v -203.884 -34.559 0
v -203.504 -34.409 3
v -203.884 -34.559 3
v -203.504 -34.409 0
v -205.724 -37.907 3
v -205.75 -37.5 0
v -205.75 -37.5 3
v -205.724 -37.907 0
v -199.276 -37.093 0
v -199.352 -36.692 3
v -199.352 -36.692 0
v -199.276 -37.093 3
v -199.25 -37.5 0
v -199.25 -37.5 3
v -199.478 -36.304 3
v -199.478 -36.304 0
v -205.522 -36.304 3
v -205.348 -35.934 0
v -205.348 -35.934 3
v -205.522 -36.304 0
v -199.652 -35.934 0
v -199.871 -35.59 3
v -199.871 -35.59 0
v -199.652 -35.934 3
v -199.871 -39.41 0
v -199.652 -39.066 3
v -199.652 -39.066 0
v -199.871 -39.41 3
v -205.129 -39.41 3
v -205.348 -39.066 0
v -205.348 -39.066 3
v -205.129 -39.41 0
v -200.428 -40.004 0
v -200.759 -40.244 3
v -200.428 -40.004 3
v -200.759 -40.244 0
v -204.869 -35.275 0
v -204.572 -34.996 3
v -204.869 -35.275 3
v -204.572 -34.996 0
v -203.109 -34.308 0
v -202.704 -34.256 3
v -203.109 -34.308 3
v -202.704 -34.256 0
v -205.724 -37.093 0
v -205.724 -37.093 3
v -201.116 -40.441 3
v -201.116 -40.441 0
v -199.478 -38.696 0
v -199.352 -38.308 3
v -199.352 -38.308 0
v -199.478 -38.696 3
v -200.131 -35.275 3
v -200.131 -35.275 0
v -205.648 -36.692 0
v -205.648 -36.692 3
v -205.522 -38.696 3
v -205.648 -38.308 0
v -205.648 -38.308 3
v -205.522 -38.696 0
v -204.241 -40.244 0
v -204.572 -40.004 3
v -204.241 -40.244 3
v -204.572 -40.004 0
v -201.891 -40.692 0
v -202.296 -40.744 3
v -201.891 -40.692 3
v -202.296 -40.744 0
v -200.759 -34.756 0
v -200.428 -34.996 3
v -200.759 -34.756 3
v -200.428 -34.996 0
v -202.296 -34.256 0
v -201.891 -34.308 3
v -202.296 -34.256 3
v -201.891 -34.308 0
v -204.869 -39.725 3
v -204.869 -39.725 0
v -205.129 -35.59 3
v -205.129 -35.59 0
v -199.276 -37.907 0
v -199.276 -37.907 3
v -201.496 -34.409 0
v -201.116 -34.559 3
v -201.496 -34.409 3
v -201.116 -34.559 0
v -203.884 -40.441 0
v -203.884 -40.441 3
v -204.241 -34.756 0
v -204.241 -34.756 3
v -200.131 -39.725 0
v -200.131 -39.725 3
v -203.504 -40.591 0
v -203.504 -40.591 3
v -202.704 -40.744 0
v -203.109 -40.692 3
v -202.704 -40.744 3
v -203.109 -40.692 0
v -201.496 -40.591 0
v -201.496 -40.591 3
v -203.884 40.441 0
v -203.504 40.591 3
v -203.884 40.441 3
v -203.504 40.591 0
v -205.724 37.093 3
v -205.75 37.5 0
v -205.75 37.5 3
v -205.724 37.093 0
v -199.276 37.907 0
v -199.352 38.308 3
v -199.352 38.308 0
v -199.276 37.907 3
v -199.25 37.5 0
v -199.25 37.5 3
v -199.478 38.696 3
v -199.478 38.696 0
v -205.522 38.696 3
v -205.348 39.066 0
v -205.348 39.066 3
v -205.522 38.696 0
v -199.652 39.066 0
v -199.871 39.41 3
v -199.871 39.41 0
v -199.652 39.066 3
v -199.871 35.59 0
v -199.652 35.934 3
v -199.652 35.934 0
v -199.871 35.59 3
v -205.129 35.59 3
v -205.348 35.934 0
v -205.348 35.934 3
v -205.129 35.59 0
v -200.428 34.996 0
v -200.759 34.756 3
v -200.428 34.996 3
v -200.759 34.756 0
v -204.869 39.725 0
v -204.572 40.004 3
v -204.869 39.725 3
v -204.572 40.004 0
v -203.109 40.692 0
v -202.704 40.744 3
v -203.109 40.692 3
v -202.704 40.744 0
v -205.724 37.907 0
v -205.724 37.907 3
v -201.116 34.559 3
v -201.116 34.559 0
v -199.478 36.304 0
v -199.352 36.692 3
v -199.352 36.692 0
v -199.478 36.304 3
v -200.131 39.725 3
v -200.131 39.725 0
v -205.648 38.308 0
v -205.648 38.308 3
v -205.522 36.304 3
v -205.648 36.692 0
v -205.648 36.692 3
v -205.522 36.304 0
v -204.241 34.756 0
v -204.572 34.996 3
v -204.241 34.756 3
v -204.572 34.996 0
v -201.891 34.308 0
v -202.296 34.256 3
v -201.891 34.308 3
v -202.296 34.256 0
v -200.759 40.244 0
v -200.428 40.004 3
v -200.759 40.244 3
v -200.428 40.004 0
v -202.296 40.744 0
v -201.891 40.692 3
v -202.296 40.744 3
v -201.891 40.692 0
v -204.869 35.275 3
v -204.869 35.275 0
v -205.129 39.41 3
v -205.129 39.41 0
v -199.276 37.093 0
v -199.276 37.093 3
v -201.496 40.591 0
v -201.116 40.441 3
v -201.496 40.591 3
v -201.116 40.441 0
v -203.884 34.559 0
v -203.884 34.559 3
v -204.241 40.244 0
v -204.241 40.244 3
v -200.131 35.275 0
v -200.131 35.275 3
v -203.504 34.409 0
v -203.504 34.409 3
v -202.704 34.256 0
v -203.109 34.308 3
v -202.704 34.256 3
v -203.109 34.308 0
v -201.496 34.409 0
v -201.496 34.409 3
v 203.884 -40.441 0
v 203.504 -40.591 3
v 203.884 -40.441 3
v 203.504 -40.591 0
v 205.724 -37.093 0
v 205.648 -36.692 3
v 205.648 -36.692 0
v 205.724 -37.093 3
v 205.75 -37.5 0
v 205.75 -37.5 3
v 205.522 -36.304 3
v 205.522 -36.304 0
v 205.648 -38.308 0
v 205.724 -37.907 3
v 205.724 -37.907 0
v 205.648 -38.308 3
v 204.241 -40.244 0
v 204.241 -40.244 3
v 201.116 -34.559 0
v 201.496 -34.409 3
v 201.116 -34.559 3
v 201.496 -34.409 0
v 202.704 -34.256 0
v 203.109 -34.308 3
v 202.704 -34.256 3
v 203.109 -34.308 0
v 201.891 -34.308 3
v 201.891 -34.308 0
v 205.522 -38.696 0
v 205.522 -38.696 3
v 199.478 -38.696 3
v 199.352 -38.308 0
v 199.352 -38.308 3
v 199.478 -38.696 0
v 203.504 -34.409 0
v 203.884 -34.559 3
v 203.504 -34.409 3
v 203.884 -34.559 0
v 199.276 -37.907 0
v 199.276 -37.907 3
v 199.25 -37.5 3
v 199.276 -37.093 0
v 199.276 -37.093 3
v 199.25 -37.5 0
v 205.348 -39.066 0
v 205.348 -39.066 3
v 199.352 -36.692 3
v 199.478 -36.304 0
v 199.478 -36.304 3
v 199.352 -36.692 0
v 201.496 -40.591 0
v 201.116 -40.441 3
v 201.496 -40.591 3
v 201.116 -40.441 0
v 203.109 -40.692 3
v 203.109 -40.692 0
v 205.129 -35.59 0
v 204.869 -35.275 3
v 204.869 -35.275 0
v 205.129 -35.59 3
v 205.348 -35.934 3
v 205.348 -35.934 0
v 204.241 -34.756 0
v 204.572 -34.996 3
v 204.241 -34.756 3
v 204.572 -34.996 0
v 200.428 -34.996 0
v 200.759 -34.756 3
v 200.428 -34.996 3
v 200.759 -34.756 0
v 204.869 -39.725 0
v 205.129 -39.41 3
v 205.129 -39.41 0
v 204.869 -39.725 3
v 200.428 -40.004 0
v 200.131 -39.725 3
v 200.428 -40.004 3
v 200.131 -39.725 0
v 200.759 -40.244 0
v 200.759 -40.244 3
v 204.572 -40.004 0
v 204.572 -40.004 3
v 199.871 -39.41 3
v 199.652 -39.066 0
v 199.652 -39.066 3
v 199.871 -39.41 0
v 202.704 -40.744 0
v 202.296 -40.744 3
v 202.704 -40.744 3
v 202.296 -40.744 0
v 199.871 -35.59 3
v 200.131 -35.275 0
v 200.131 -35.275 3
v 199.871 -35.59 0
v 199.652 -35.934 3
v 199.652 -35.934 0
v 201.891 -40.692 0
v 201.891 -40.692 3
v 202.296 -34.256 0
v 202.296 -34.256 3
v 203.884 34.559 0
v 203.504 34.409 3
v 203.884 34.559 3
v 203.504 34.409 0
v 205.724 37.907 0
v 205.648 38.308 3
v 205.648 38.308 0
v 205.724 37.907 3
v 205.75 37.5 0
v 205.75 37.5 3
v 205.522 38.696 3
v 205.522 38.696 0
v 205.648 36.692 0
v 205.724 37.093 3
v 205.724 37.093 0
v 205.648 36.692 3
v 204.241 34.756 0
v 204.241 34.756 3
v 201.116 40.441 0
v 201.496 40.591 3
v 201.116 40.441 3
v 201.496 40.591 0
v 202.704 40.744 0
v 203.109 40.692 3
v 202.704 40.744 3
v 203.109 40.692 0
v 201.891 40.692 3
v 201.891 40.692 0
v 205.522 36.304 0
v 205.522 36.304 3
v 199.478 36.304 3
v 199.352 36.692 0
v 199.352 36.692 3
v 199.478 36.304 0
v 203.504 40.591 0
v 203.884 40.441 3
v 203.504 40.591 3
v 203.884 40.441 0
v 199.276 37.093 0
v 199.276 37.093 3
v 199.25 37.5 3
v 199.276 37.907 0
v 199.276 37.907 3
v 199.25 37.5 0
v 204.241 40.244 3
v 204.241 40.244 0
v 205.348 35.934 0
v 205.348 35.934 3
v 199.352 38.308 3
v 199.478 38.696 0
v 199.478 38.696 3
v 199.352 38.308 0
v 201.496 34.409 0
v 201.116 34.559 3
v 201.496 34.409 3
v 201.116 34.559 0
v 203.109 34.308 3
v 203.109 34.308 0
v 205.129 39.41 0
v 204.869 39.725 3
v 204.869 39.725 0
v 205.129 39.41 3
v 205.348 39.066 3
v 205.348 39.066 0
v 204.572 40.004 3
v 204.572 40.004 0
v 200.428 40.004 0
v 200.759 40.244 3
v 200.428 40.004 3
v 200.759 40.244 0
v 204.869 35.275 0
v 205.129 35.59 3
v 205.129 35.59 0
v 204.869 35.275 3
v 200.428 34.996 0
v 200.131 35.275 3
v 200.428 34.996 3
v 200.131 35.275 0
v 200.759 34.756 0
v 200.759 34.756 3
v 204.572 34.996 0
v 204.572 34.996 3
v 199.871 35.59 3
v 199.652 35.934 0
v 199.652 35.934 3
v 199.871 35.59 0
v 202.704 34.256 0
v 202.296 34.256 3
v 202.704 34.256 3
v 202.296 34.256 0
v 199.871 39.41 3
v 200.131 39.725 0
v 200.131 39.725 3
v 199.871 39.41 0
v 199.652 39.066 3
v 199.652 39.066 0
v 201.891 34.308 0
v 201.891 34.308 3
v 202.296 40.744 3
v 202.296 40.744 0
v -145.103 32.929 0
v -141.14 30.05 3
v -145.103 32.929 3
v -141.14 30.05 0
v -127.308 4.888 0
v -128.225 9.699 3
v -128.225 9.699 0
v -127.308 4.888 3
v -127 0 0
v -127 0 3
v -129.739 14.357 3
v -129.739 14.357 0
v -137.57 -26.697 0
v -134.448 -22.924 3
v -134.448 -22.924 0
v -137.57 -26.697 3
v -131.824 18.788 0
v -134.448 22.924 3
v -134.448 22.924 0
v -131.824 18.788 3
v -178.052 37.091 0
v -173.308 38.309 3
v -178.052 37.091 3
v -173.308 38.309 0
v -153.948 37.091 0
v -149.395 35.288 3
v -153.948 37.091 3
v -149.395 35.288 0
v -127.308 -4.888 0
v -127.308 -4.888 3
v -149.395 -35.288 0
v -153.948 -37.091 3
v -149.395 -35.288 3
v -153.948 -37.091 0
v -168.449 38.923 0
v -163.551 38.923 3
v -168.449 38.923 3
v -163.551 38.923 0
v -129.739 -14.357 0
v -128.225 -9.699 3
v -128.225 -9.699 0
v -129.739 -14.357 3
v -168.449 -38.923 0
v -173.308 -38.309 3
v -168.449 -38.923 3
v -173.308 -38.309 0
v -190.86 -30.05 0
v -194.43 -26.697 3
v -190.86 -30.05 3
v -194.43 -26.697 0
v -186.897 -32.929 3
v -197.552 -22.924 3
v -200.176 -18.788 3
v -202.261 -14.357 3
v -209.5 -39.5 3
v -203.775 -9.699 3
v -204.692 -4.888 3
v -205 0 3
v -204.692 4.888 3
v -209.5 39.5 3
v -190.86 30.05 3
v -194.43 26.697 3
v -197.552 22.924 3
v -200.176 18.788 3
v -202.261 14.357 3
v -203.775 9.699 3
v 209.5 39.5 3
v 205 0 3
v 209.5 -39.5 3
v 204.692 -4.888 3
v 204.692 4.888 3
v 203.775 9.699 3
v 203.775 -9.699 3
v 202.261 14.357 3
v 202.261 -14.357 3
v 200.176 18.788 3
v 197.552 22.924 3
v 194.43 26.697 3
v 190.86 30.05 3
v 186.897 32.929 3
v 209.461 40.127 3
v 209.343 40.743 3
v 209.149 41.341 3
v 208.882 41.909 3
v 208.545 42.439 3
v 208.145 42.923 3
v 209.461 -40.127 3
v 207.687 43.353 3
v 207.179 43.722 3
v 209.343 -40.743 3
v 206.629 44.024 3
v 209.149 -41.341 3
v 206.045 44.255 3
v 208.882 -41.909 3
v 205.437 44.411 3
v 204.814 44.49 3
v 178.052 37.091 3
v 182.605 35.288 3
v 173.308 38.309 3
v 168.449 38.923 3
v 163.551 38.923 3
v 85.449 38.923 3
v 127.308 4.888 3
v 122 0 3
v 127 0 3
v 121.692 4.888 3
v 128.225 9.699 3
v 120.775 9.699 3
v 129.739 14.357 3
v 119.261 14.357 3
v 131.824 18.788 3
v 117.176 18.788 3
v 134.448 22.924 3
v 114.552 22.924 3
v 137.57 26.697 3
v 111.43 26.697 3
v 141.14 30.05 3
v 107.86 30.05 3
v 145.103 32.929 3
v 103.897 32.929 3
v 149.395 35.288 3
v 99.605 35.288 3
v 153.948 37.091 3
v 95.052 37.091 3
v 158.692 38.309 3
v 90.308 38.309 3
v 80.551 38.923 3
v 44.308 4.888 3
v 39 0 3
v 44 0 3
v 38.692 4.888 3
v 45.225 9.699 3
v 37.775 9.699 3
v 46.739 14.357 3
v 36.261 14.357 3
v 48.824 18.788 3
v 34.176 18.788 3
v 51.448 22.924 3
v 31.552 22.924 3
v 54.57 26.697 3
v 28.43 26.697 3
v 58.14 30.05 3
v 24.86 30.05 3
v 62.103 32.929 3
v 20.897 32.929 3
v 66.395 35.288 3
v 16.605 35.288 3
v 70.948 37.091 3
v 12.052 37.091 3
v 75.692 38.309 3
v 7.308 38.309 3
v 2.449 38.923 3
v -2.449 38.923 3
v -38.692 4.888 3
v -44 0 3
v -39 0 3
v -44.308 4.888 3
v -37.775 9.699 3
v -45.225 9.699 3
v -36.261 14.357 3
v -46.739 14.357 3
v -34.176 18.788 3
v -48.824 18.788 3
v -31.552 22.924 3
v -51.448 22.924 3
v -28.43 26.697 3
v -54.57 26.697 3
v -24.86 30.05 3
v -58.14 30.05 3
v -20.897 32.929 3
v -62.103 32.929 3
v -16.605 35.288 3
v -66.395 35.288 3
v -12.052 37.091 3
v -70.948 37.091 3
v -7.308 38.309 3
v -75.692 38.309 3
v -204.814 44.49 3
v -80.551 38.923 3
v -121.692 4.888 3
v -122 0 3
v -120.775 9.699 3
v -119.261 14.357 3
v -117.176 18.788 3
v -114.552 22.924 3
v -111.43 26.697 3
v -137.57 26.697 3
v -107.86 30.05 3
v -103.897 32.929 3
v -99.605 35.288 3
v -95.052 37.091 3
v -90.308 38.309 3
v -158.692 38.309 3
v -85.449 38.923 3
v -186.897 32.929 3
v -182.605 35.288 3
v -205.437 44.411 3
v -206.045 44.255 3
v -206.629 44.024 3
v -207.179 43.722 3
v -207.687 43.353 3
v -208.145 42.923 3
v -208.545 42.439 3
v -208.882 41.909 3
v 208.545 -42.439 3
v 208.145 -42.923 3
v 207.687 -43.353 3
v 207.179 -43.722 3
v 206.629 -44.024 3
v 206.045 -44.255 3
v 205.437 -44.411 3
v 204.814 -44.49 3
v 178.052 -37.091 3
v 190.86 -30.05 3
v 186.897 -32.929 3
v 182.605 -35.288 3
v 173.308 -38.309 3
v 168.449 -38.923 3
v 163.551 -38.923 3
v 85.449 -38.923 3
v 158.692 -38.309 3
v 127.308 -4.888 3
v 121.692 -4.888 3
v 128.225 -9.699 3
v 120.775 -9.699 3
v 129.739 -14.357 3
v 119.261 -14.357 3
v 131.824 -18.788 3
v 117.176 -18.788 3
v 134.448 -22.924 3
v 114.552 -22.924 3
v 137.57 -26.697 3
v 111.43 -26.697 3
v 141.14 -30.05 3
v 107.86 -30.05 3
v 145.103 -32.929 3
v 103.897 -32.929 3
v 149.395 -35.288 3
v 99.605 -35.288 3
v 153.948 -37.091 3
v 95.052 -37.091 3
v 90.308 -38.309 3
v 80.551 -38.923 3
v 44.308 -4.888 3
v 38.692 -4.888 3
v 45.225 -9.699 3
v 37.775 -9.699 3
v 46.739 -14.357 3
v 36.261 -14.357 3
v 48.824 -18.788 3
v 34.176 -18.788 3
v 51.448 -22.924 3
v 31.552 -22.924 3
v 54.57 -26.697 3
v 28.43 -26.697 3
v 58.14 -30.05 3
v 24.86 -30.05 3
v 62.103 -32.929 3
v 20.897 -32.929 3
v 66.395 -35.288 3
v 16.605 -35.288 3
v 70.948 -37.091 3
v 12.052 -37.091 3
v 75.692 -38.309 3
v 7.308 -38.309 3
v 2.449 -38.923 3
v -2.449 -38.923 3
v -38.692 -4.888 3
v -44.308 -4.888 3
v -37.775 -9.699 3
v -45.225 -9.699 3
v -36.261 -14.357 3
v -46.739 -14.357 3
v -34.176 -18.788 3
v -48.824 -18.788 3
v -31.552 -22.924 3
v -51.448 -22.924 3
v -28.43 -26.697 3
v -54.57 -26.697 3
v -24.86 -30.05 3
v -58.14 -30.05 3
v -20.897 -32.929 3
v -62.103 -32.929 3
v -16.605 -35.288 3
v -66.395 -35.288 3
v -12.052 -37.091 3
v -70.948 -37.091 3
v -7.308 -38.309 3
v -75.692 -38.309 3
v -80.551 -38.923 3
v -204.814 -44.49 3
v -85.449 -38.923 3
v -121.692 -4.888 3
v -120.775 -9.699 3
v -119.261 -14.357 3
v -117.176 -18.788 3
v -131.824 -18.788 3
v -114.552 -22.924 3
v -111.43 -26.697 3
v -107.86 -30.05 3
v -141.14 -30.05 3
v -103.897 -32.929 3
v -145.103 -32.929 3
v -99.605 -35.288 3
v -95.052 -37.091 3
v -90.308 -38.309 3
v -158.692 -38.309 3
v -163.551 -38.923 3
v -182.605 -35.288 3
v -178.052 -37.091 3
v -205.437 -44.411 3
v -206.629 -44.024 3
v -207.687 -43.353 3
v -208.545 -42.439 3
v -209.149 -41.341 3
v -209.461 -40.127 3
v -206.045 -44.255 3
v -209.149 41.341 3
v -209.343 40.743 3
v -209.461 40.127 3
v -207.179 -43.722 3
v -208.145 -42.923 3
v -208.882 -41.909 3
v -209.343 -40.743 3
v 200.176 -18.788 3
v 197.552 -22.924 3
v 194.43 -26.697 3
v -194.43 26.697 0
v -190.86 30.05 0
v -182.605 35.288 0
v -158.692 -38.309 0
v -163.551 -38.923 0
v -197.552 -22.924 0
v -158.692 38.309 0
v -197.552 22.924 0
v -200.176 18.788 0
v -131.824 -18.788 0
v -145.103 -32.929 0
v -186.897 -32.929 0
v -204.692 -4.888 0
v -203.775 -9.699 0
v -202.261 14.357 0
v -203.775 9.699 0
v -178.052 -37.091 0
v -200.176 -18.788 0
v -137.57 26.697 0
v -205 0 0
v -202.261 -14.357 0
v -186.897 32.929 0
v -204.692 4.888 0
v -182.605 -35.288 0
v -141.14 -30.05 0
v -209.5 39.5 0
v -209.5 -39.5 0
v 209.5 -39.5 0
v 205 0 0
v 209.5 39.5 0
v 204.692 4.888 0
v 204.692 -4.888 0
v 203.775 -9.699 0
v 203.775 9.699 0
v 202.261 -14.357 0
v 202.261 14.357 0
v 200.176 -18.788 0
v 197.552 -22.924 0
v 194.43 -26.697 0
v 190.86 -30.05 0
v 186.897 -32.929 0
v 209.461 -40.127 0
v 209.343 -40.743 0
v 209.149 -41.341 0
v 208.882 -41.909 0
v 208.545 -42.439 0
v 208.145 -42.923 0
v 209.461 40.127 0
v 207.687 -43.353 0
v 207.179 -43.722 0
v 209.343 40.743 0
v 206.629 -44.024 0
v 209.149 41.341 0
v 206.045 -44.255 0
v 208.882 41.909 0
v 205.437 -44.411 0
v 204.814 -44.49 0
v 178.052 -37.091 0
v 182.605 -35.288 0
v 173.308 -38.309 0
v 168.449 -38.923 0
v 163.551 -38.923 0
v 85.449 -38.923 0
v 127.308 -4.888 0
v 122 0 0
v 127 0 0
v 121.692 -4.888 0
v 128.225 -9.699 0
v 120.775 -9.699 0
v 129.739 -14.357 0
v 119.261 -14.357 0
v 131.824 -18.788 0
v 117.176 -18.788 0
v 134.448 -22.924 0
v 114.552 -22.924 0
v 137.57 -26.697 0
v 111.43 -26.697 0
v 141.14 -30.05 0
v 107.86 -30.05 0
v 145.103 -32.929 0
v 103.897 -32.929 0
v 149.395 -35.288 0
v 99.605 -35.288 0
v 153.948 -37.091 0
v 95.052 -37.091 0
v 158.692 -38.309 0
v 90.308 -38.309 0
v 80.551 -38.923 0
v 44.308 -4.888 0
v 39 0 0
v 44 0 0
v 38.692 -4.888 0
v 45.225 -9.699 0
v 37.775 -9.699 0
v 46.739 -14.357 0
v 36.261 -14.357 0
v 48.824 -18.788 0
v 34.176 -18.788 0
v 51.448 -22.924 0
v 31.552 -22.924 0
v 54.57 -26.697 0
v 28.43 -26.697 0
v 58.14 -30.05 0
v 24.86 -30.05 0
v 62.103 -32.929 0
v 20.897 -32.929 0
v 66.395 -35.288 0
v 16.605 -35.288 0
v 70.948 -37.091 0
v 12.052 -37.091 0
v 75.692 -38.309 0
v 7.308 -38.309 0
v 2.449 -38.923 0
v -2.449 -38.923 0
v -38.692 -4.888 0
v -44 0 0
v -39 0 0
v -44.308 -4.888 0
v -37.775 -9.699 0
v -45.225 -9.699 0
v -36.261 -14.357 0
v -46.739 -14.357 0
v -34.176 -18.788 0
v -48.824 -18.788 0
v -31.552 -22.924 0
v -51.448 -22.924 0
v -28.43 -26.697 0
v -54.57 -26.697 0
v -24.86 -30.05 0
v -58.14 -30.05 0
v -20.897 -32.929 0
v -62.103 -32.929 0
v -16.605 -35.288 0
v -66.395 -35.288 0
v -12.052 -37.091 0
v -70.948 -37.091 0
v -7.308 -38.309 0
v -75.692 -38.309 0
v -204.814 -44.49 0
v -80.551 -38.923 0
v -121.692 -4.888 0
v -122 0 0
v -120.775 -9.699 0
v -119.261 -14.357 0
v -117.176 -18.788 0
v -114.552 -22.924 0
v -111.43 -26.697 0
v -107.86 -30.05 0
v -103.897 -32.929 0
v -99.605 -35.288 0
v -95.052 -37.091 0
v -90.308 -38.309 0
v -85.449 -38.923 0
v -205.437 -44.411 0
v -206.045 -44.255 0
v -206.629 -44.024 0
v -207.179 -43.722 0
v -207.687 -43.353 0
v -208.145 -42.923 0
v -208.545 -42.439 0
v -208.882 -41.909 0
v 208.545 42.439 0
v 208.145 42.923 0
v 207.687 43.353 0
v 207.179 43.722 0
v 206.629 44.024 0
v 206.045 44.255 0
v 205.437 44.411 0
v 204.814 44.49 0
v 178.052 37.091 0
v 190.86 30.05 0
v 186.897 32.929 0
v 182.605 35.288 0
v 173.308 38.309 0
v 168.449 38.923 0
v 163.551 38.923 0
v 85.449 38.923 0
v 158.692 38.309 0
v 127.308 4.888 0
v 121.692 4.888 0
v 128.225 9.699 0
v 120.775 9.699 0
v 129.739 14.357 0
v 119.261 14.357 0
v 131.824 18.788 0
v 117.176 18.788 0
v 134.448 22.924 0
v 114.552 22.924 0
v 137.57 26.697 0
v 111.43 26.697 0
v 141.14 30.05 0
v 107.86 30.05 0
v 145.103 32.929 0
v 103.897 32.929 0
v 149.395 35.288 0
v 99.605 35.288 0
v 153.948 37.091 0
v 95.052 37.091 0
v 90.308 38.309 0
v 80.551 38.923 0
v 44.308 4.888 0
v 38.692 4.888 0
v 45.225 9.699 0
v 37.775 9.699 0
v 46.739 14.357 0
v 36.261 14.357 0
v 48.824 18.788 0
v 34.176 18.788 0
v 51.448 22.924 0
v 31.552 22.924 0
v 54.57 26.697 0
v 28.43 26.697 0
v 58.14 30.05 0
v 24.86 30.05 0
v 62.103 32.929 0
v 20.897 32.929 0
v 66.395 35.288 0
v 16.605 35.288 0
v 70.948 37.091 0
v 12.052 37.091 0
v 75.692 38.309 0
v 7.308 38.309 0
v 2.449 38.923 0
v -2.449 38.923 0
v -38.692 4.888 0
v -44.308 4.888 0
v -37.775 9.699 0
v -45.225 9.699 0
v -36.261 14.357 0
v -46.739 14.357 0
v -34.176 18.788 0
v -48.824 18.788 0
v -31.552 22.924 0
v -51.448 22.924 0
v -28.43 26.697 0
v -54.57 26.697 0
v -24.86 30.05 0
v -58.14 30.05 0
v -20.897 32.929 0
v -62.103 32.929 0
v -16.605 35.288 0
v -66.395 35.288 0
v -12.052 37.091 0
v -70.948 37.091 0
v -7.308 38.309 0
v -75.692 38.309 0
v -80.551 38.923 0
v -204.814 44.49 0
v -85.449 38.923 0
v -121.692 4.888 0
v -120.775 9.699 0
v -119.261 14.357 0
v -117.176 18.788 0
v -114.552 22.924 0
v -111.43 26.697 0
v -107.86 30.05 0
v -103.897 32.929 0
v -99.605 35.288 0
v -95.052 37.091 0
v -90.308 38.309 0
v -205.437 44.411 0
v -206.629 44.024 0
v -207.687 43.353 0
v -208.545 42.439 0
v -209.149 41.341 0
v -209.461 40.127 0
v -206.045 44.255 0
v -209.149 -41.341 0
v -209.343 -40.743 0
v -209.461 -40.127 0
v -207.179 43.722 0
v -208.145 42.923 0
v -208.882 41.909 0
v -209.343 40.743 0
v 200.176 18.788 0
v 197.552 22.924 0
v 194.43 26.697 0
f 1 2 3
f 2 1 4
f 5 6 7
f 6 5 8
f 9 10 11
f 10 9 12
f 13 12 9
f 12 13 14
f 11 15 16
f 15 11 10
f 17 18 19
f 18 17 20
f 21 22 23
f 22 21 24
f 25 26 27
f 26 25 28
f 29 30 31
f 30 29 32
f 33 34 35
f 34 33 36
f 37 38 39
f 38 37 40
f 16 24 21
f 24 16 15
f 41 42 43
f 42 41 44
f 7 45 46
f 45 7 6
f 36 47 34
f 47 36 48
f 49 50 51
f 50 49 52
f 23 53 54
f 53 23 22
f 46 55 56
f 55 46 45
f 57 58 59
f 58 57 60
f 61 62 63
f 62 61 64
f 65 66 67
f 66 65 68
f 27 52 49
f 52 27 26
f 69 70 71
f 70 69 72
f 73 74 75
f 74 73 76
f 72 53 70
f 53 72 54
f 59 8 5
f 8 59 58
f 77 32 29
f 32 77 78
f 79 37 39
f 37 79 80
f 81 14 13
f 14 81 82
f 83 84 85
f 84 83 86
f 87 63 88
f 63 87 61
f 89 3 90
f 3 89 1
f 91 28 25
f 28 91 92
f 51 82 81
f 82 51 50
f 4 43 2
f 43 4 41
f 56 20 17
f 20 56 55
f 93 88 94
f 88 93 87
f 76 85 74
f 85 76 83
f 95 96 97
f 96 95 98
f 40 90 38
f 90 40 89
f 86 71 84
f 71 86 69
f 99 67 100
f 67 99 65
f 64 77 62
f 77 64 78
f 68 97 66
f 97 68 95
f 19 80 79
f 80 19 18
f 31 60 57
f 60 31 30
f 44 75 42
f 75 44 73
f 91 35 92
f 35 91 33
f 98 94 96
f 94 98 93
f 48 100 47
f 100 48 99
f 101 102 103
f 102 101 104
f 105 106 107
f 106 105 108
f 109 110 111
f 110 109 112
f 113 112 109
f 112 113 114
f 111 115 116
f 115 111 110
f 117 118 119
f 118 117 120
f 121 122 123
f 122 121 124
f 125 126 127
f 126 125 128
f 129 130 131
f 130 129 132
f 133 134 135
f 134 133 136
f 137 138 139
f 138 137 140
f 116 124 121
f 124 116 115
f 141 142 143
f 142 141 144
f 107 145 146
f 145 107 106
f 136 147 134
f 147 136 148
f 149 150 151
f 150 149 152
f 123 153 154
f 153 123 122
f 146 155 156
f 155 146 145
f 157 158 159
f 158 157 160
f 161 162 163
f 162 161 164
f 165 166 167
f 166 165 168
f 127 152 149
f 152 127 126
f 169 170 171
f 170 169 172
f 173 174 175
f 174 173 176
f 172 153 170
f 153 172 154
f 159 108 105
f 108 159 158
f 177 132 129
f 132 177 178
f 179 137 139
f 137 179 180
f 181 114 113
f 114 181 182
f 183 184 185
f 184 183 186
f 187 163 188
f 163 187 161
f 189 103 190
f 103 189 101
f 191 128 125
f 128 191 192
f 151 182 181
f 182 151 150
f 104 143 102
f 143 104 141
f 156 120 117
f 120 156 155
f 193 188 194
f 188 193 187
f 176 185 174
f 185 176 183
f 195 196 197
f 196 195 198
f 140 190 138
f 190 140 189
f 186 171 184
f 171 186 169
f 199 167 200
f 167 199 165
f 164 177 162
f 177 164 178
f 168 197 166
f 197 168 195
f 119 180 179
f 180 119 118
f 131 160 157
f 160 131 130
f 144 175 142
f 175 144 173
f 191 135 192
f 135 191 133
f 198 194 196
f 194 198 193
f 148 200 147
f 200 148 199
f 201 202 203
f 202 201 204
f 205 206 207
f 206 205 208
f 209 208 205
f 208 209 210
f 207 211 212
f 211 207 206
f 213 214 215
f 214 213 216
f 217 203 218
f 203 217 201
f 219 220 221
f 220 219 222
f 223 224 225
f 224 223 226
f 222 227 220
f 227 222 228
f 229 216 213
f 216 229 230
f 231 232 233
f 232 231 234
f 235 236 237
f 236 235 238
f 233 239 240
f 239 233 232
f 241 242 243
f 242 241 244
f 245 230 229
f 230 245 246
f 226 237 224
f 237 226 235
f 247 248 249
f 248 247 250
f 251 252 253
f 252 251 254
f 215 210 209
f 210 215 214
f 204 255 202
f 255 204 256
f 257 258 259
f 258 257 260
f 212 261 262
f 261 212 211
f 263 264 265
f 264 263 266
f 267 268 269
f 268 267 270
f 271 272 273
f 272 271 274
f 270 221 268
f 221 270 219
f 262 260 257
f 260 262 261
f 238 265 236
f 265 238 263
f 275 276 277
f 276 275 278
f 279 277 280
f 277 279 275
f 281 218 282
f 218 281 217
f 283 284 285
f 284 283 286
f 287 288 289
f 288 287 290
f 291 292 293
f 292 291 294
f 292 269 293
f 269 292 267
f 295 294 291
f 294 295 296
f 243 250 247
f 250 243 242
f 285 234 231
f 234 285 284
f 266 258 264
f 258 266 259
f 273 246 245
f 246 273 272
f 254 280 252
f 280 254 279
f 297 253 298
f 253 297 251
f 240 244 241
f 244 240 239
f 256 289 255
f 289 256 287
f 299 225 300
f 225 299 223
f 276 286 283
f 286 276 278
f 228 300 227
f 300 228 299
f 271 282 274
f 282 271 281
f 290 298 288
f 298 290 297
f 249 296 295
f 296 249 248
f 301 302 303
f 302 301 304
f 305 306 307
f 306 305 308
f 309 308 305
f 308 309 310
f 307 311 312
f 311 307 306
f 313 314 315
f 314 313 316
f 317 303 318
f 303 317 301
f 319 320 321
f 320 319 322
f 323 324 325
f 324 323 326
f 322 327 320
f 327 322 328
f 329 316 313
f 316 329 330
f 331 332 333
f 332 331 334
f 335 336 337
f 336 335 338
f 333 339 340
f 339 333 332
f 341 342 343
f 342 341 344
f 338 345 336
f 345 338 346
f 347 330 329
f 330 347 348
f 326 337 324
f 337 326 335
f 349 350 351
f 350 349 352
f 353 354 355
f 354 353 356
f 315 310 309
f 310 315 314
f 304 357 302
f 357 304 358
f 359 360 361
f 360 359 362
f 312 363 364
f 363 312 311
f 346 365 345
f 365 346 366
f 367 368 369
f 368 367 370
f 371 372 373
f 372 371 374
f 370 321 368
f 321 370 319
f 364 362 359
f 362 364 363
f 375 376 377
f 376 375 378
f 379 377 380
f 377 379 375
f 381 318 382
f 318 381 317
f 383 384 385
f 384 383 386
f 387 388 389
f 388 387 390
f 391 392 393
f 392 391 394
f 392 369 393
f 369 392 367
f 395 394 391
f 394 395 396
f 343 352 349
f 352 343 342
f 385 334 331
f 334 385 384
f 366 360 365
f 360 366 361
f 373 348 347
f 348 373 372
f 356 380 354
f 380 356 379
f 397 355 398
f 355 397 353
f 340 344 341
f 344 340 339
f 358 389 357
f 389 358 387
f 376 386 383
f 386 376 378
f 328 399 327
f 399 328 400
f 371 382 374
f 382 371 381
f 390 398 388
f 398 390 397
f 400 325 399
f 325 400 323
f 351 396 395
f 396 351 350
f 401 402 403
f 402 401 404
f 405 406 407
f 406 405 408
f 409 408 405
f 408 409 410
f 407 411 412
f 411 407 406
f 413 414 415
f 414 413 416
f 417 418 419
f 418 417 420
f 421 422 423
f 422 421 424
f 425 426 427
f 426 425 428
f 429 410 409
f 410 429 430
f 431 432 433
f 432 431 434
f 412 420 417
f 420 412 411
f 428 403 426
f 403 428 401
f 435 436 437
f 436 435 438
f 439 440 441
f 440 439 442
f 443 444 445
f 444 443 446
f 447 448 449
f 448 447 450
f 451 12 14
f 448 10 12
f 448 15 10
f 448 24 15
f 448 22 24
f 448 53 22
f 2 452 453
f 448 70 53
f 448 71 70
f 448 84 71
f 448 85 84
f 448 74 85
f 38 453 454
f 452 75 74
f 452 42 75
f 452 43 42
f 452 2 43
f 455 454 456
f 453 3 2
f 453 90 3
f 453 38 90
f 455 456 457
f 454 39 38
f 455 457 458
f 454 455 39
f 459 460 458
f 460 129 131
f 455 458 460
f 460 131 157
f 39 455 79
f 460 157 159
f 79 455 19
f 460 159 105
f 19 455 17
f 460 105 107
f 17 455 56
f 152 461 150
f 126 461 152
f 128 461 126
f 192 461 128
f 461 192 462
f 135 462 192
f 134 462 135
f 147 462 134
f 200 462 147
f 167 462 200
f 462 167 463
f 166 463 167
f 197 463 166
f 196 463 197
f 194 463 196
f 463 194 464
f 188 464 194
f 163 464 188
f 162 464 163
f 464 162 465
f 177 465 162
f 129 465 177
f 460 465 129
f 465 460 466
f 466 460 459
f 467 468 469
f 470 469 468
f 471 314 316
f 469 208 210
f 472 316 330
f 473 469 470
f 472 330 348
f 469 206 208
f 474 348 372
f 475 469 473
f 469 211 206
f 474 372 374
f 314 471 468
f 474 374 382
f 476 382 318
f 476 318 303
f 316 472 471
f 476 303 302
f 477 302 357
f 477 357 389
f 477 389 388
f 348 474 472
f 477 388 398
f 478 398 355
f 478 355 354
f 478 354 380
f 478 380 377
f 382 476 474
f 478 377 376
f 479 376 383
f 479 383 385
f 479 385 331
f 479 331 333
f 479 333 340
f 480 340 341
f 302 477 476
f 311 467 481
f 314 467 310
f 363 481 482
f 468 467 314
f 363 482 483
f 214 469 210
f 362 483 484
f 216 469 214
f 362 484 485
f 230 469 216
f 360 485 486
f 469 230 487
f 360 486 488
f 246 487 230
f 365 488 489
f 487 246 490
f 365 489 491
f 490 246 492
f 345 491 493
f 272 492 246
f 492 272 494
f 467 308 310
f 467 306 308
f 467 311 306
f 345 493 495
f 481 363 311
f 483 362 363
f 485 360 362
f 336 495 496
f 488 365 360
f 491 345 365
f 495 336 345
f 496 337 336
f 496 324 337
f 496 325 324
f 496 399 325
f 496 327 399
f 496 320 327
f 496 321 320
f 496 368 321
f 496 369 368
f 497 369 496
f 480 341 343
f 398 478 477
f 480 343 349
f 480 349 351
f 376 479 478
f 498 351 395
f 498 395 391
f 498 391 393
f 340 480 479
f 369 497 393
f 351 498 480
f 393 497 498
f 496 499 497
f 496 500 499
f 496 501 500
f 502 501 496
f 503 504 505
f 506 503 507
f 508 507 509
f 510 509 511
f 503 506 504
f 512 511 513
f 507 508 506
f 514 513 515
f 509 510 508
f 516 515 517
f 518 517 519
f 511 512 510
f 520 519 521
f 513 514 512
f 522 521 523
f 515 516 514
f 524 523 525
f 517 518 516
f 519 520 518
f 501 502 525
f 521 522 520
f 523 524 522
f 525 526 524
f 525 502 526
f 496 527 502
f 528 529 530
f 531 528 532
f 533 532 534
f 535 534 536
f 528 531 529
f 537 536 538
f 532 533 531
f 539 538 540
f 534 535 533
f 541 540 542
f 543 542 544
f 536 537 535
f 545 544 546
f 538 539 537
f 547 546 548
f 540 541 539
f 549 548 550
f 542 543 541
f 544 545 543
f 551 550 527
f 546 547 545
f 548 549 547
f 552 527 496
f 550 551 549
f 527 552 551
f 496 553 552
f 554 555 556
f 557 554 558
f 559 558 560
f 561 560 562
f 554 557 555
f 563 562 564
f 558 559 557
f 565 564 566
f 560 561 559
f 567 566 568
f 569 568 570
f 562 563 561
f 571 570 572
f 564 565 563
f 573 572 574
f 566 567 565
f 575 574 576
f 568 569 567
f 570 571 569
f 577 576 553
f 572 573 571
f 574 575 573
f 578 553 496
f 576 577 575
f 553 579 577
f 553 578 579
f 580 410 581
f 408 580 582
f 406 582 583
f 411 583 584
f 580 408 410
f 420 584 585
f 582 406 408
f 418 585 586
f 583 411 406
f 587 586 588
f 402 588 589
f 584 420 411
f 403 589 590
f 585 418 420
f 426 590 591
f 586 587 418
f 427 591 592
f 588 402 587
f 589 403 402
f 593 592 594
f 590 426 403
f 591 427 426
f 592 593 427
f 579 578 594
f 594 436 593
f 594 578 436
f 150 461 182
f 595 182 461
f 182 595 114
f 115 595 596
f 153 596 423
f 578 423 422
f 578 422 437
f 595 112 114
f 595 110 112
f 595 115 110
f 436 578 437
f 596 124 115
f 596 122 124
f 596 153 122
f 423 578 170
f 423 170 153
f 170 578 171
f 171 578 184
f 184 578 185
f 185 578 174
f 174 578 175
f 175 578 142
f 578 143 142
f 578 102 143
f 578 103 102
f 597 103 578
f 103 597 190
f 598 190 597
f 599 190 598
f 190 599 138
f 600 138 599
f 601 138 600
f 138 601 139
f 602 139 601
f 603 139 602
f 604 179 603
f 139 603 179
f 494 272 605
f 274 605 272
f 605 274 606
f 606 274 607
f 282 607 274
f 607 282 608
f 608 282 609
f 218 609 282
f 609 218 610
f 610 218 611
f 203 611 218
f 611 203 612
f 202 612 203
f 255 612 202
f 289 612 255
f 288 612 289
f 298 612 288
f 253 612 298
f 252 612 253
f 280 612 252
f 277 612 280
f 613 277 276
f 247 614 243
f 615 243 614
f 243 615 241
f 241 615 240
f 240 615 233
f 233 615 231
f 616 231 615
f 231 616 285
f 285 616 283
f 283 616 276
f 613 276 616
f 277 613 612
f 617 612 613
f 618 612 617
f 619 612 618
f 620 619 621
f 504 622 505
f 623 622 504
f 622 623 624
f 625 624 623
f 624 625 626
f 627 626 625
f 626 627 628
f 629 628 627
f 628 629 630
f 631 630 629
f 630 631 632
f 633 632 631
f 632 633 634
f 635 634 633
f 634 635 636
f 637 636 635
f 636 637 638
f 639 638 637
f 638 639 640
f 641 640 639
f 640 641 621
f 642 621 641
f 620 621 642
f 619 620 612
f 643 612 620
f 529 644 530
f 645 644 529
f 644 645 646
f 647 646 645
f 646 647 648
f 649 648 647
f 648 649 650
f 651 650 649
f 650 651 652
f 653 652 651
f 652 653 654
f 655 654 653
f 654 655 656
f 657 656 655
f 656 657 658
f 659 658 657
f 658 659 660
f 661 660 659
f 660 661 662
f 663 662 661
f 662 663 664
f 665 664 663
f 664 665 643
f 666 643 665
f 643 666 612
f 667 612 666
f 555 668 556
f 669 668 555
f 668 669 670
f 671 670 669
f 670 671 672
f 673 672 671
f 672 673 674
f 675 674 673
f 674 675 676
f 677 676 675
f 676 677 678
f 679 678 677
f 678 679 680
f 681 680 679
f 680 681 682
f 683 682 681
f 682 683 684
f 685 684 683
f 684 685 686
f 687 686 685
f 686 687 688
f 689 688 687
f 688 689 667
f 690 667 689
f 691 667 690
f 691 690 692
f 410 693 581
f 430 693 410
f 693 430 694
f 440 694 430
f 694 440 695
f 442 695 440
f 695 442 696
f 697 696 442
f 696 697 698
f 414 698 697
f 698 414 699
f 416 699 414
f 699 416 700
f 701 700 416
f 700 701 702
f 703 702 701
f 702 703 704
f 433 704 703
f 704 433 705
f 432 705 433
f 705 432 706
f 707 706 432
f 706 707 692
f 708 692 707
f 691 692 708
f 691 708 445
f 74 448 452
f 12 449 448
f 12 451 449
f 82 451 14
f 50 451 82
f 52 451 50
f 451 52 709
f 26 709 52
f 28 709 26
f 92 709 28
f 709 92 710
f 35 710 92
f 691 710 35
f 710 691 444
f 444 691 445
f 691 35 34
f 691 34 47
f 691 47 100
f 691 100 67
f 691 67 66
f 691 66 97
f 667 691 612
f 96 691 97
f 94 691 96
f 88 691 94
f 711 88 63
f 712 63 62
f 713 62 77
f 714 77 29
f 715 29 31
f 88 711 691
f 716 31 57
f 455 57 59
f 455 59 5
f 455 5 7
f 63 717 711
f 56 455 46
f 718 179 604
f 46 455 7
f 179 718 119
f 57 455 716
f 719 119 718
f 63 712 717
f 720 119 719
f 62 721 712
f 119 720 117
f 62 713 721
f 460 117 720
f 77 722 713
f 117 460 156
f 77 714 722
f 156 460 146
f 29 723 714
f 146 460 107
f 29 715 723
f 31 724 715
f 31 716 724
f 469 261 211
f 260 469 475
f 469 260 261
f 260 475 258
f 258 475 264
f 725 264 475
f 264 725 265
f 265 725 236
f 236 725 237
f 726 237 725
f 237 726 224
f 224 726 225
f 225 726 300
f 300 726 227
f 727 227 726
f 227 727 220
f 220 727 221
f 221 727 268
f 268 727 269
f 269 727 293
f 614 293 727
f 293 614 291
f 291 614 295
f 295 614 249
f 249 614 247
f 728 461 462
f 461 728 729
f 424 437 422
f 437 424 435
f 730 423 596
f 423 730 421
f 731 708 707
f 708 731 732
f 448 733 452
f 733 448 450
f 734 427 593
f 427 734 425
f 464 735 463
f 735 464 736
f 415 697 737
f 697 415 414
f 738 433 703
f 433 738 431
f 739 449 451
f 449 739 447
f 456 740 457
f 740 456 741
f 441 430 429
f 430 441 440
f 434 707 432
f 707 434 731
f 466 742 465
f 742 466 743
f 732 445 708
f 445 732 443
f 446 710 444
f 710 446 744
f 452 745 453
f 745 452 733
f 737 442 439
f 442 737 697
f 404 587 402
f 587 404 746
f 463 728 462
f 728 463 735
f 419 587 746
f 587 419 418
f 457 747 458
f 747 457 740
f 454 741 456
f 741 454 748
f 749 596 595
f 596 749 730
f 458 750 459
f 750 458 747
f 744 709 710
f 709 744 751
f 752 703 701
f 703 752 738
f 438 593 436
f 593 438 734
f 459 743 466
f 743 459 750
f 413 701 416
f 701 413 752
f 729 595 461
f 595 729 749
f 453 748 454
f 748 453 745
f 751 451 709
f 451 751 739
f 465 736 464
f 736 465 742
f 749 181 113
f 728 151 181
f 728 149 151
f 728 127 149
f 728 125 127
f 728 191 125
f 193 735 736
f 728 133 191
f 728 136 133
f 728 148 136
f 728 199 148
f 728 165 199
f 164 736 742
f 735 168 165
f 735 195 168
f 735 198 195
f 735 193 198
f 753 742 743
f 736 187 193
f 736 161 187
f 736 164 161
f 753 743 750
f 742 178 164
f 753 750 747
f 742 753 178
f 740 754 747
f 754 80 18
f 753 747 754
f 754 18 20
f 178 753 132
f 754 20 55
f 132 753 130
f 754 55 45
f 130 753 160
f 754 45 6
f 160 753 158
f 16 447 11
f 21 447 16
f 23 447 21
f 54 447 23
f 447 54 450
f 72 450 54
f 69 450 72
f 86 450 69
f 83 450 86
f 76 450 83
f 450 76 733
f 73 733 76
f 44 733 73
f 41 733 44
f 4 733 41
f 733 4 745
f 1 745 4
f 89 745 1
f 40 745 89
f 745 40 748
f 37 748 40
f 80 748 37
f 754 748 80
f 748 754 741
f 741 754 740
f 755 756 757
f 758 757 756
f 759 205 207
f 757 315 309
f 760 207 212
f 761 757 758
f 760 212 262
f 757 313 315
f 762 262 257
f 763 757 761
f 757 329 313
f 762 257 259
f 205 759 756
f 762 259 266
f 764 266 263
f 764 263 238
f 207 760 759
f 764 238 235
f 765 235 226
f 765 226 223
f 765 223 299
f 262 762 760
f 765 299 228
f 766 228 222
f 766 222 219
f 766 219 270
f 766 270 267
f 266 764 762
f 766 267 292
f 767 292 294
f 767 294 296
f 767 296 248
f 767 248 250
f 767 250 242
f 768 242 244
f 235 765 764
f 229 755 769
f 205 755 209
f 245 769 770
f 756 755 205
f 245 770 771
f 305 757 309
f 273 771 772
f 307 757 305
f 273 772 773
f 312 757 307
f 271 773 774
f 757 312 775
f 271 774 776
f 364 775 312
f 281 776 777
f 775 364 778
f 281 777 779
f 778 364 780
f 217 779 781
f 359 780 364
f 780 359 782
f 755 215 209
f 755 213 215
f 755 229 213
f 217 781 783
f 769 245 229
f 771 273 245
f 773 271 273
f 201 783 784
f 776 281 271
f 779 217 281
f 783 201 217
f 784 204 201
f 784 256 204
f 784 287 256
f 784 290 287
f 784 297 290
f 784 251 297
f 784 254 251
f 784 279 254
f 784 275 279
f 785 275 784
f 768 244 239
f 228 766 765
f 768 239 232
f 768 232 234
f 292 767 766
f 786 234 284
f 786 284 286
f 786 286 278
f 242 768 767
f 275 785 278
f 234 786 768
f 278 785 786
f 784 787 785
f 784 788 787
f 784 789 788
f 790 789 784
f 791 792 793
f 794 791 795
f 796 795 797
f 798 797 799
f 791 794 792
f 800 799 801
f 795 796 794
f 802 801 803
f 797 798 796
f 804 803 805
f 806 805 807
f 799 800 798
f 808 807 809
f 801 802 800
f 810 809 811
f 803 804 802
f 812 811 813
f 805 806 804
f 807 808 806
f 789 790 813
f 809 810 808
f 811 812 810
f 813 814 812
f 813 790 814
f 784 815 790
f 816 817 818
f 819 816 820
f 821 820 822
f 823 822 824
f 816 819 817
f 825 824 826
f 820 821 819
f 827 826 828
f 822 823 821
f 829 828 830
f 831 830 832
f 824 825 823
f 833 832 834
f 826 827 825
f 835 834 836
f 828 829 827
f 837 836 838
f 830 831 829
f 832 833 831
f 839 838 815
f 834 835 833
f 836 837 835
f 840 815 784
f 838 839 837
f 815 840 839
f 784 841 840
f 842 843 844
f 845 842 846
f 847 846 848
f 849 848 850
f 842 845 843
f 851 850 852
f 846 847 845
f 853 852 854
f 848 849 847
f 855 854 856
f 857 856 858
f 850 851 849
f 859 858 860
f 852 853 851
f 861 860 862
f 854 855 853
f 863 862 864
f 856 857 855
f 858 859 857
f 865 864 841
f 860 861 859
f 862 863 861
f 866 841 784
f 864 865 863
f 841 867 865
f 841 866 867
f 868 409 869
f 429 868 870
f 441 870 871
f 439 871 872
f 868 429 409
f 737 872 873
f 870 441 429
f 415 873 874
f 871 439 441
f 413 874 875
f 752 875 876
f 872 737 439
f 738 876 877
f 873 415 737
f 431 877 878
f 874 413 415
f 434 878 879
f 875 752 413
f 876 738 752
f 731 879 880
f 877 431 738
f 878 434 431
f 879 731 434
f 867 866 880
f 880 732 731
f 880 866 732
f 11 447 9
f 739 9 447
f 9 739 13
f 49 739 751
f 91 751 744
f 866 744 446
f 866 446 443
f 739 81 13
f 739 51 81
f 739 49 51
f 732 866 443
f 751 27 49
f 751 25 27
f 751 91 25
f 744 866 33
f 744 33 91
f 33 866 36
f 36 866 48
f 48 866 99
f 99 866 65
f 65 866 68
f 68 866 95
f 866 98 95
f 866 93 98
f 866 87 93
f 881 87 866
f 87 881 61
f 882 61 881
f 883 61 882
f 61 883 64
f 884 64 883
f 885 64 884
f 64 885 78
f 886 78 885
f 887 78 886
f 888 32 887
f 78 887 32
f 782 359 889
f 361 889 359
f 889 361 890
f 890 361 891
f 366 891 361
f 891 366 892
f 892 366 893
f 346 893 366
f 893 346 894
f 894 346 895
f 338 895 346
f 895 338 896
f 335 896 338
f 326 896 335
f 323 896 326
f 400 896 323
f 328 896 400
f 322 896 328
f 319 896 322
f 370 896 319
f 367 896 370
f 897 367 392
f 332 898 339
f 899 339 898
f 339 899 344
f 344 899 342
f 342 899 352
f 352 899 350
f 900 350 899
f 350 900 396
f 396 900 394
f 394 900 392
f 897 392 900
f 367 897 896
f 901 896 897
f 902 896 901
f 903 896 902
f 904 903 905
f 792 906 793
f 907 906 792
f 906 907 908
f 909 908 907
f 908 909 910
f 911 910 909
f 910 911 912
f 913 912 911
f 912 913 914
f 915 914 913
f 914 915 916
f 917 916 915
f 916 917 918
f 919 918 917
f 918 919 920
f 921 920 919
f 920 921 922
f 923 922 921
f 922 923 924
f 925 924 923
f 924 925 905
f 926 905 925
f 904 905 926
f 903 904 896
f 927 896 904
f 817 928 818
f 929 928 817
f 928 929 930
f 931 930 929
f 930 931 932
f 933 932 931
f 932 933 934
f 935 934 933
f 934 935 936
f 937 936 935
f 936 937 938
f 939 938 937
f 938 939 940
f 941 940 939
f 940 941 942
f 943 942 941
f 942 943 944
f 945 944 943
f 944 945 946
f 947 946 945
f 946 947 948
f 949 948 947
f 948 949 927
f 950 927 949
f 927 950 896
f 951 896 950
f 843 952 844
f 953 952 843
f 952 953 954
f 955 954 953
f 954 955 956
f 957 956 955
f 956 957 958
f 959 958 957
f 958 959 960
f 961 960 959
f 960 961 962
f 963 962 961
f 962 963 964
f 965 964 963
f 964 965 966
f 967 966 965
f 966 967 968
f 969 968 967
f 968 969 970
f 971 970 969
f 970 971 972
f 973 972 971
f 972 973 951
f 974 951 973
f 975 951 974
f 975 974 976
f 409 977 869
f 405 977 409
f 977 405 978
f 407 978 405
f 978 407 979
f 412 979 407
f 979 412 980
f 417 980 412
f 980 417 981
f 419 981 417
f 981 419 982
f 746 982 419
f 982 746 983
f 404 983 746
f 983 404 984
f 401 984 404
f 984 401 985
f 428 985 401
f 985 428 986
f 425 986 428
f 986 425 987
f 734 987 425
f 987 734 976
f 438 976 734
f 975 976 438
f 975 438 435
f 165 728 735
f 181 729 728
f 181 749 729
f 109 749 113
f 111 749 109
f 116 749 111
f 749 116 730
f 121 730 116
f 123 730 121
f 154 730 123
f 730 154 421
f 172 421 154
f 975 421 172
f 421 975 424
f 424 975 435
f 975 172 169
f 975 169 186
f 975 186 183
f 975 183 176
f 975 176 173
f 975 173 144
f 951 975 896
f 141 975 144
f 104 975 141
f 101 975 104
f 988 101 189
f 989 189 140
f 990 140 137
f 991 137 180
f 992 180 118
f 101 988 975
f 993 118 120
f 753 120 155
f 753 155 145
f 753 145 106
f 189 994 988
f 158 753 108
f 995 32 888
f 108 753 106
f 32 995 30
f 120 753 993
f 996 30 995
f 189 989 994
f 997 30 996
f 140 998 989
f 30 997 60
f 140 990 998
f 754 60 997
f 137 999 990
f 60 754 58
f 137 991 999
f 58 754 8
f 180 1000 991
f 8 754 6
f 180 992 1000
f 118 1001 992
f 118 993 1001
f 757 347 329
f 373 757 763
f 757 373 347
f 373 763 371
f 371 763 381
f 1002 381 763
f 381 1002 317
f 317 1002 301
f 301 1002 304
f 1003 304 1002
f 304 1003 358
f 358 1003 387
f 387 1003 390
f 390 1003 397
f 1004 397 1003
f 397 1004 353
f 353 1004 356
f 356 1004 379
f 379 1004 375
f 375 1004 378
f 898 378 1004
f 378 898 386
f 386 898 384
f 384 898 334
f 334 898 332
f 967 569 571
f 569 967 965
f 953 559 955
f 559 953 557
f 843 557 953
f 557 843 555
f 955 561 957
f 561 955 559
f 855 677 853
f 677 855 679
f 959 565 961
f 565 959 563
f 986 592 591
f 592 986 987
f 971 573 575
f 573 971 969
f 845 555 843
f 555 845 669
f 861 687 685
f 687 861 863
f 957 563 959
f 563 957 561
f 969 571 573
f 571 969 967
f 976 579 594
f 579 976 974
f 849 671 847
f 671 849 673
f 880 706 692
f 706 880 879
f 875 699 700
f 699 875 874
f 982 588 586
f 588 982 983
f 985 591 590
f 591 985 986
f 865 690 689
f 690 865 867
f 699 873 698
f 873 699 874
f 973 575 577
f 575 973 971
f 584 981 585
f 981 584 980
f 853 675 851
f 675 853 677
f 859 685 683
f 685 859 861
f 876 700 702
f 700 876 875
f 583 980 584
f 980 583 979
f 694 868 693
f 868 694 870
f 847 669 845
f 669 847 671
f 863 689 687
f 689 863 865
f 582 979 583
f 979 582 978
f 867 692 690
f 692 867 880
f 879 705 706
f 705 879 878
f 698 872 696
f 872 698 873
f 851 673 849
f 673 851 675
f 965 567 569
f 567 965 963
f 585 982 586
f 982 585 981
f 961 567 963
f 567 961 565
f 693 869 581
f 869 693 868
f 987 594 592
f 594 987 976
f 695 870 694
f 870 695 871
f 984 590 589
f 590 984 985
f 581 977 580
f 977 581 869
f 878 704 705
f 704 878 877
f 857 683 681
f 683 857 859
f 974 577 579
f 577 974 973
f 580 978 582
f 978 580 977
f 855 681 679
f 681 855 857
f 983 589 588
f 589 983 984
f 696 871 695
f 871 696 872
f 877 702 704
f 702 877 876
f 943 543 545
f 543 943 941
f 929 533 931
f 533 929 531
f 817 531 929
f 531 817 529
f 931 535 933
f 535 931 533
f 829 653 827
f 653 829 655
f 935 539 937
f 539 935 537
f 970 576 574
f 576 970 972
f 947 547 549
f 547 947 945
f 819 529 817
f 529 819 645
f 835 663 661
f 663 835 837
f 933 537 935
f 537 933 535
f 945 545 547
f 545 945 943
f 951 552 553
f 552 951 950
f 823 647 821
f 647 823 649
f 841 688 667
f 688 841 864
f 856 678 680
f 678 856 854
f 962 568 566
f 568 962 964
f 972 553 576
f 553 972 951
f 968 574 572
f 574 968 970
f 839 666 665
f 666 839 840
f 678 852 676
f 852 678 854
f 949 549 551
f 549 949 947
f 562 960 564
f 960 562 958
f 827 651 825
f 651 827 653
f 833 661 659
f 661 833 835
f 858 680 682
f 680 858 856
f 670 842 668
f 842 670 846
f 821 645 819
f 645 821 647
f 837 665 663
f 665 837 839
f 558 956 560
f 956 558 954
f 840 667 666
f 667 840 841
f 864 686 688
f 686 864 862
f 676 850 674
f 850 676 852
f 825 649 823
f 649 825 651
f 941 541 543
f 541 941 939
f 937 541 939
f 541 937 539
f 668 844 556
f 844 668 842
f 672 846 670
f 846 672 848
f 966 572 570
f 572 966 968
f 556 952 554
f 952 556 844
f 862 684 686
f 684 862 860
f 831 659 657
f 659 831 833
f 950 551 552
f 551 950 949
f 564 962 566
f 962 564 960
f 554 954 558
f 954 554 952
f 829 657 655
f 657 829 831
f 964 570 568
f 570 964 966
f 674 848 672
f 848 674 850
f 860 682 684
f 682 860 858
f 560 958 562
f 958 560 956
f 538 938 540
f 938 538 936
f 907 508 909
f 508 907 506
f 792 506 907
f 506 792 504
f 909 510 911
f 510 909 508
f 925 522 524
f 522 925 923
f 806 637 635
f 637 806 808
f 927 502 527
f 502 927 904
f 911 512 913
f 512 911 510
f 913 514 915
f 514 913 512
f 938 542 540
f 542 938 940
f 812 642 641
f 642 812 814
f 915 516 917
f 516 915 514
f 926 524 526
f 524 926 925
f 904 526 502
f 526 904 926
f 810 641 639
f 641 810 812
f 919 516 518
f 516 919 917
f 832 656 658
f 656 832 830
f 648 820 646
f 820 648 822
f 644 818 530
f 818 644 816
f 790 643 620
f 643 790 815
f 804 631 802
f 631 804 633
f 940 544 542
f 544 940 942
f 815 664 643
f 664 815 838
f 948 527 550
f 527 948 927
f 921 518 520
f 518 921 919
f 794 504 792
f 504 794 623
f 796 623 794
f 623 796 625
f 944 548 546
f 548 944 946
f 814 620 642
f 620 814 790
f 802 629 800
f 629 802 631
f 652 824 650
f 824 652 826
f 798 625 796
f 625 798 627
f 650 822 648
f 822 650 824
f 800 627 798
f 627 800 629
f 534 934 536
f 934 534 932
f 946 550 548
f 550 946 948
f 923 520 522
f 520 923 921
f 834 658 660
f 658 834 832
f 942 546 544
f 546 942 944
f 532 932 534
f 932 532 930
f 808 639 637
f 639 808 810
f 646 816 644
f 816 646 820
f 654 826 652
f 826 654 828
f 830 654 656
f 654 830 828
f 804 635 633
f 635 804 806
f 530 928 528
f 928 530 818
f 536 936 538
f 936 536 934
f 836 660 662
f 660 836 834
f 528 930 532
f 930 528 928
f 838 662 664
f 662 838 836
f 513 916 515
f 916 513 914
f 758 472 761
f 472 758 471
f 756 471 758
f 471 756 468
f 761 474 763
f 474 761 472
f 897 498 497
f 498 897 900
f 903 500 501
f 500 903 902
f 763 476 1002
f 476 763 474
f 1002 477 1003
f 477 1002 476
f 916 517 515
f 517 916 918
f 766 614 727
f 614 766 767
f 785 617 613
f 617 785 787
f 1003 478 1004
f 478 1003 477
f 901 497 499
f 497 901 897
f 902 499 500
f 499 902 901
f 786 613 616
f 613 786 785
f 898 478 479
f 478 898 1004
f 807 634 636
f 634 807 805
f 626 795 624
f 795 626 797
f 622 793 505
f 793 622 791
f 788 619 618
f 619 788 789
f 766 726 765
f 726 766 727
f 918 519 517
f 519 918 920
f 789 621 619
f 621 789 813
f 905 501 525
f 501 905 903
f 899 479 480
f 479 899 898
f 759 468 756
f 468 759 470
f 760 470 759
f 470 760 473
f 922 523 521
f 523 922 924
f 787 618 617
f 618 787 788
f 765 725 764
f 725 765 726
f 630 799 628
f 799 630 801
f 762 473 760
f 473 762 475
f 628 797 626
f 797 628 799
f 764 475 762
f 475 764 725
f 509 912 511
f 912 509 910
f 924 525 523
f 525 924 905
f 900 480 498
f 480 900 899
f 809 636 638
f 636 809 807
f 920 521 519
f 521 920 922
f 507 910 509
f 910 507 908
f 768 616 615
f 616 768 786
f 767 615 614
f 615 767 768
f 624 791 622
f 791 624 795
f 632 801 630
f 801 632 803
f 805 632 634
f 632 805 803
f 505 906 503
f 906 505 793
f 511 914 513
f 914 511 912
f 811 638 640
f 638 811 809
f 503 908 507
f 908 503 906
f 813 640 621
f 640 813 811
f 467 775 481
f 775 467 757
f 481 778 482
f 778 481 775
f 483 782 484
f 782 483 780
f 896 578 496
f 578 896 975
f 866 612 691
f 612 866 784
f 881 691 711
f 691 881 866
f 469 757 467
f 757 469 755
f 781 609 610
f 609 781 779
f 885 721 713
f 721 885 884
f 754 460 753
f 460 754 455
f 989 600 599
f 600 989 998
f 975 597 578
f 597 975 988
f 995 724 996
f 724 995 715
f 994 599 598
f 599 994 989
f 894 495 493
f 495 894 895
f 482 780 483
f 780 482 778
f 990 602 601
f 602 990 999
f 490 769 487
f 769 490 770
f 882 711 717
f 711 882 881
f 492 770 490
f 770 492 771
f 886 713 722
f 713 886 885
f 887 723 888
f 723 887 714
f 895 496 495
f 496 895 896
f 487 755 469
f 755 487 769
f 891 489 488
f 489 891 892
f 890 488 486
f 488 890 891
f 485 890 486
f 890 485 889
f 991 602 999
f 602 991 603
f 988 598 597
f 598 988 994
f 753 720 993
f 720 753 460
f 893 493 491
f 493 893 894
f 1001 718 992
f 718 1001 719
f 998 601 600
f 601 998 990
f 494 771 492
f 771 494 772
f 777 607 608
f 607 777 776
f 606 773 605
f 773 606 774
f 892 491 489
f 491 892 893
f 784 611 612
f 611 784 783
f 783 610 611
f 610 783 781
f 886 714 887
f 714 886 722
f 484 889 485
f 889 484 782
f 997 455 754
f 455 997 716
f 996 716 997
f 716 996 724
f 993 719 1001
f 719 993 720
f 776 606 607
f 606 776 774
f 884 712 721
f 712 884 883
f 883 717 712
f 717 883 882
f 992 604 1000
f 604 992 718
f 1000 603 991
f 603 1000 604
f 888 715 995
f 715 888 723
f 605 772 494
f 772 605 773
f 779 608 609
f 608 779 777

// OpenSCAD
$fn = 50;

difference() {
	union() {
		hull() {
			translate(v = [-204.5, 39.5, 0]) {
				cylinder(h = 3, r = 5);
			}
			translate(v = [204.5, 39.5, 0]) {
				cylinder(h = 3, r = 5);
			}
			translate(v = [-204.5, -39.5, 0]) {
				cylinder(h = 3, r = 5);
			}
			translate(v = [204.5, -39.5, 0]) {
				cylinder(h = 3, r = 5);
			}
		}
	}
	union() {
		translate(v = [-202.5, -37.5, -100.0]) {
			cylinder(h = 200, r = 3.25);
		}
		translate(v = [-202.5, 37.5, -100.0]) {
			cylinder(h = 200, r = 3.25);
		}
		translate(v = [202.5, -37.5, -100.0]) {
			cylinder(h = 200, r = 3.25);
		}
		translate(v = [202.5, 37.5, -100.0]) {
			cylinder(h = 200, r = 3.25);
		}
		translate(v = [-202.5, -37.5, -100.0]) {
			cylinder(h = 200, r = 1.8);
		}
		translate(v = [-202.5, 37.5, -100.0]) {
			cylinder(h = 200, r = 1.8);
		}
		translate(v = [202.5, -37.5, -100.0]) {
			cylinder(h = 200, r = 1.8);
		}
		translate(v = [202.5, 37.5, -100.0]) {
			cylinder(h = 200, r = 1.8);
		}
		translate(v = [-166.0, 0, 0.0]) {
			cylinder(h = 3, r = 39.0);
		}
		translate(v = [-83.0, 0, 0.0]) {
			cylinder(h = 3, r = 39.0);
		}
		cylinder(h = 3, r = 39.0);
		translate(v = [83.0, 0, 0.0]) {
			cylinder(h = 3, r = 39.0);
		}
		translate(v = [166.0, 0, 0.0]) {
			cylinder(h = 3, r = 39.0);
		}
	}
}
